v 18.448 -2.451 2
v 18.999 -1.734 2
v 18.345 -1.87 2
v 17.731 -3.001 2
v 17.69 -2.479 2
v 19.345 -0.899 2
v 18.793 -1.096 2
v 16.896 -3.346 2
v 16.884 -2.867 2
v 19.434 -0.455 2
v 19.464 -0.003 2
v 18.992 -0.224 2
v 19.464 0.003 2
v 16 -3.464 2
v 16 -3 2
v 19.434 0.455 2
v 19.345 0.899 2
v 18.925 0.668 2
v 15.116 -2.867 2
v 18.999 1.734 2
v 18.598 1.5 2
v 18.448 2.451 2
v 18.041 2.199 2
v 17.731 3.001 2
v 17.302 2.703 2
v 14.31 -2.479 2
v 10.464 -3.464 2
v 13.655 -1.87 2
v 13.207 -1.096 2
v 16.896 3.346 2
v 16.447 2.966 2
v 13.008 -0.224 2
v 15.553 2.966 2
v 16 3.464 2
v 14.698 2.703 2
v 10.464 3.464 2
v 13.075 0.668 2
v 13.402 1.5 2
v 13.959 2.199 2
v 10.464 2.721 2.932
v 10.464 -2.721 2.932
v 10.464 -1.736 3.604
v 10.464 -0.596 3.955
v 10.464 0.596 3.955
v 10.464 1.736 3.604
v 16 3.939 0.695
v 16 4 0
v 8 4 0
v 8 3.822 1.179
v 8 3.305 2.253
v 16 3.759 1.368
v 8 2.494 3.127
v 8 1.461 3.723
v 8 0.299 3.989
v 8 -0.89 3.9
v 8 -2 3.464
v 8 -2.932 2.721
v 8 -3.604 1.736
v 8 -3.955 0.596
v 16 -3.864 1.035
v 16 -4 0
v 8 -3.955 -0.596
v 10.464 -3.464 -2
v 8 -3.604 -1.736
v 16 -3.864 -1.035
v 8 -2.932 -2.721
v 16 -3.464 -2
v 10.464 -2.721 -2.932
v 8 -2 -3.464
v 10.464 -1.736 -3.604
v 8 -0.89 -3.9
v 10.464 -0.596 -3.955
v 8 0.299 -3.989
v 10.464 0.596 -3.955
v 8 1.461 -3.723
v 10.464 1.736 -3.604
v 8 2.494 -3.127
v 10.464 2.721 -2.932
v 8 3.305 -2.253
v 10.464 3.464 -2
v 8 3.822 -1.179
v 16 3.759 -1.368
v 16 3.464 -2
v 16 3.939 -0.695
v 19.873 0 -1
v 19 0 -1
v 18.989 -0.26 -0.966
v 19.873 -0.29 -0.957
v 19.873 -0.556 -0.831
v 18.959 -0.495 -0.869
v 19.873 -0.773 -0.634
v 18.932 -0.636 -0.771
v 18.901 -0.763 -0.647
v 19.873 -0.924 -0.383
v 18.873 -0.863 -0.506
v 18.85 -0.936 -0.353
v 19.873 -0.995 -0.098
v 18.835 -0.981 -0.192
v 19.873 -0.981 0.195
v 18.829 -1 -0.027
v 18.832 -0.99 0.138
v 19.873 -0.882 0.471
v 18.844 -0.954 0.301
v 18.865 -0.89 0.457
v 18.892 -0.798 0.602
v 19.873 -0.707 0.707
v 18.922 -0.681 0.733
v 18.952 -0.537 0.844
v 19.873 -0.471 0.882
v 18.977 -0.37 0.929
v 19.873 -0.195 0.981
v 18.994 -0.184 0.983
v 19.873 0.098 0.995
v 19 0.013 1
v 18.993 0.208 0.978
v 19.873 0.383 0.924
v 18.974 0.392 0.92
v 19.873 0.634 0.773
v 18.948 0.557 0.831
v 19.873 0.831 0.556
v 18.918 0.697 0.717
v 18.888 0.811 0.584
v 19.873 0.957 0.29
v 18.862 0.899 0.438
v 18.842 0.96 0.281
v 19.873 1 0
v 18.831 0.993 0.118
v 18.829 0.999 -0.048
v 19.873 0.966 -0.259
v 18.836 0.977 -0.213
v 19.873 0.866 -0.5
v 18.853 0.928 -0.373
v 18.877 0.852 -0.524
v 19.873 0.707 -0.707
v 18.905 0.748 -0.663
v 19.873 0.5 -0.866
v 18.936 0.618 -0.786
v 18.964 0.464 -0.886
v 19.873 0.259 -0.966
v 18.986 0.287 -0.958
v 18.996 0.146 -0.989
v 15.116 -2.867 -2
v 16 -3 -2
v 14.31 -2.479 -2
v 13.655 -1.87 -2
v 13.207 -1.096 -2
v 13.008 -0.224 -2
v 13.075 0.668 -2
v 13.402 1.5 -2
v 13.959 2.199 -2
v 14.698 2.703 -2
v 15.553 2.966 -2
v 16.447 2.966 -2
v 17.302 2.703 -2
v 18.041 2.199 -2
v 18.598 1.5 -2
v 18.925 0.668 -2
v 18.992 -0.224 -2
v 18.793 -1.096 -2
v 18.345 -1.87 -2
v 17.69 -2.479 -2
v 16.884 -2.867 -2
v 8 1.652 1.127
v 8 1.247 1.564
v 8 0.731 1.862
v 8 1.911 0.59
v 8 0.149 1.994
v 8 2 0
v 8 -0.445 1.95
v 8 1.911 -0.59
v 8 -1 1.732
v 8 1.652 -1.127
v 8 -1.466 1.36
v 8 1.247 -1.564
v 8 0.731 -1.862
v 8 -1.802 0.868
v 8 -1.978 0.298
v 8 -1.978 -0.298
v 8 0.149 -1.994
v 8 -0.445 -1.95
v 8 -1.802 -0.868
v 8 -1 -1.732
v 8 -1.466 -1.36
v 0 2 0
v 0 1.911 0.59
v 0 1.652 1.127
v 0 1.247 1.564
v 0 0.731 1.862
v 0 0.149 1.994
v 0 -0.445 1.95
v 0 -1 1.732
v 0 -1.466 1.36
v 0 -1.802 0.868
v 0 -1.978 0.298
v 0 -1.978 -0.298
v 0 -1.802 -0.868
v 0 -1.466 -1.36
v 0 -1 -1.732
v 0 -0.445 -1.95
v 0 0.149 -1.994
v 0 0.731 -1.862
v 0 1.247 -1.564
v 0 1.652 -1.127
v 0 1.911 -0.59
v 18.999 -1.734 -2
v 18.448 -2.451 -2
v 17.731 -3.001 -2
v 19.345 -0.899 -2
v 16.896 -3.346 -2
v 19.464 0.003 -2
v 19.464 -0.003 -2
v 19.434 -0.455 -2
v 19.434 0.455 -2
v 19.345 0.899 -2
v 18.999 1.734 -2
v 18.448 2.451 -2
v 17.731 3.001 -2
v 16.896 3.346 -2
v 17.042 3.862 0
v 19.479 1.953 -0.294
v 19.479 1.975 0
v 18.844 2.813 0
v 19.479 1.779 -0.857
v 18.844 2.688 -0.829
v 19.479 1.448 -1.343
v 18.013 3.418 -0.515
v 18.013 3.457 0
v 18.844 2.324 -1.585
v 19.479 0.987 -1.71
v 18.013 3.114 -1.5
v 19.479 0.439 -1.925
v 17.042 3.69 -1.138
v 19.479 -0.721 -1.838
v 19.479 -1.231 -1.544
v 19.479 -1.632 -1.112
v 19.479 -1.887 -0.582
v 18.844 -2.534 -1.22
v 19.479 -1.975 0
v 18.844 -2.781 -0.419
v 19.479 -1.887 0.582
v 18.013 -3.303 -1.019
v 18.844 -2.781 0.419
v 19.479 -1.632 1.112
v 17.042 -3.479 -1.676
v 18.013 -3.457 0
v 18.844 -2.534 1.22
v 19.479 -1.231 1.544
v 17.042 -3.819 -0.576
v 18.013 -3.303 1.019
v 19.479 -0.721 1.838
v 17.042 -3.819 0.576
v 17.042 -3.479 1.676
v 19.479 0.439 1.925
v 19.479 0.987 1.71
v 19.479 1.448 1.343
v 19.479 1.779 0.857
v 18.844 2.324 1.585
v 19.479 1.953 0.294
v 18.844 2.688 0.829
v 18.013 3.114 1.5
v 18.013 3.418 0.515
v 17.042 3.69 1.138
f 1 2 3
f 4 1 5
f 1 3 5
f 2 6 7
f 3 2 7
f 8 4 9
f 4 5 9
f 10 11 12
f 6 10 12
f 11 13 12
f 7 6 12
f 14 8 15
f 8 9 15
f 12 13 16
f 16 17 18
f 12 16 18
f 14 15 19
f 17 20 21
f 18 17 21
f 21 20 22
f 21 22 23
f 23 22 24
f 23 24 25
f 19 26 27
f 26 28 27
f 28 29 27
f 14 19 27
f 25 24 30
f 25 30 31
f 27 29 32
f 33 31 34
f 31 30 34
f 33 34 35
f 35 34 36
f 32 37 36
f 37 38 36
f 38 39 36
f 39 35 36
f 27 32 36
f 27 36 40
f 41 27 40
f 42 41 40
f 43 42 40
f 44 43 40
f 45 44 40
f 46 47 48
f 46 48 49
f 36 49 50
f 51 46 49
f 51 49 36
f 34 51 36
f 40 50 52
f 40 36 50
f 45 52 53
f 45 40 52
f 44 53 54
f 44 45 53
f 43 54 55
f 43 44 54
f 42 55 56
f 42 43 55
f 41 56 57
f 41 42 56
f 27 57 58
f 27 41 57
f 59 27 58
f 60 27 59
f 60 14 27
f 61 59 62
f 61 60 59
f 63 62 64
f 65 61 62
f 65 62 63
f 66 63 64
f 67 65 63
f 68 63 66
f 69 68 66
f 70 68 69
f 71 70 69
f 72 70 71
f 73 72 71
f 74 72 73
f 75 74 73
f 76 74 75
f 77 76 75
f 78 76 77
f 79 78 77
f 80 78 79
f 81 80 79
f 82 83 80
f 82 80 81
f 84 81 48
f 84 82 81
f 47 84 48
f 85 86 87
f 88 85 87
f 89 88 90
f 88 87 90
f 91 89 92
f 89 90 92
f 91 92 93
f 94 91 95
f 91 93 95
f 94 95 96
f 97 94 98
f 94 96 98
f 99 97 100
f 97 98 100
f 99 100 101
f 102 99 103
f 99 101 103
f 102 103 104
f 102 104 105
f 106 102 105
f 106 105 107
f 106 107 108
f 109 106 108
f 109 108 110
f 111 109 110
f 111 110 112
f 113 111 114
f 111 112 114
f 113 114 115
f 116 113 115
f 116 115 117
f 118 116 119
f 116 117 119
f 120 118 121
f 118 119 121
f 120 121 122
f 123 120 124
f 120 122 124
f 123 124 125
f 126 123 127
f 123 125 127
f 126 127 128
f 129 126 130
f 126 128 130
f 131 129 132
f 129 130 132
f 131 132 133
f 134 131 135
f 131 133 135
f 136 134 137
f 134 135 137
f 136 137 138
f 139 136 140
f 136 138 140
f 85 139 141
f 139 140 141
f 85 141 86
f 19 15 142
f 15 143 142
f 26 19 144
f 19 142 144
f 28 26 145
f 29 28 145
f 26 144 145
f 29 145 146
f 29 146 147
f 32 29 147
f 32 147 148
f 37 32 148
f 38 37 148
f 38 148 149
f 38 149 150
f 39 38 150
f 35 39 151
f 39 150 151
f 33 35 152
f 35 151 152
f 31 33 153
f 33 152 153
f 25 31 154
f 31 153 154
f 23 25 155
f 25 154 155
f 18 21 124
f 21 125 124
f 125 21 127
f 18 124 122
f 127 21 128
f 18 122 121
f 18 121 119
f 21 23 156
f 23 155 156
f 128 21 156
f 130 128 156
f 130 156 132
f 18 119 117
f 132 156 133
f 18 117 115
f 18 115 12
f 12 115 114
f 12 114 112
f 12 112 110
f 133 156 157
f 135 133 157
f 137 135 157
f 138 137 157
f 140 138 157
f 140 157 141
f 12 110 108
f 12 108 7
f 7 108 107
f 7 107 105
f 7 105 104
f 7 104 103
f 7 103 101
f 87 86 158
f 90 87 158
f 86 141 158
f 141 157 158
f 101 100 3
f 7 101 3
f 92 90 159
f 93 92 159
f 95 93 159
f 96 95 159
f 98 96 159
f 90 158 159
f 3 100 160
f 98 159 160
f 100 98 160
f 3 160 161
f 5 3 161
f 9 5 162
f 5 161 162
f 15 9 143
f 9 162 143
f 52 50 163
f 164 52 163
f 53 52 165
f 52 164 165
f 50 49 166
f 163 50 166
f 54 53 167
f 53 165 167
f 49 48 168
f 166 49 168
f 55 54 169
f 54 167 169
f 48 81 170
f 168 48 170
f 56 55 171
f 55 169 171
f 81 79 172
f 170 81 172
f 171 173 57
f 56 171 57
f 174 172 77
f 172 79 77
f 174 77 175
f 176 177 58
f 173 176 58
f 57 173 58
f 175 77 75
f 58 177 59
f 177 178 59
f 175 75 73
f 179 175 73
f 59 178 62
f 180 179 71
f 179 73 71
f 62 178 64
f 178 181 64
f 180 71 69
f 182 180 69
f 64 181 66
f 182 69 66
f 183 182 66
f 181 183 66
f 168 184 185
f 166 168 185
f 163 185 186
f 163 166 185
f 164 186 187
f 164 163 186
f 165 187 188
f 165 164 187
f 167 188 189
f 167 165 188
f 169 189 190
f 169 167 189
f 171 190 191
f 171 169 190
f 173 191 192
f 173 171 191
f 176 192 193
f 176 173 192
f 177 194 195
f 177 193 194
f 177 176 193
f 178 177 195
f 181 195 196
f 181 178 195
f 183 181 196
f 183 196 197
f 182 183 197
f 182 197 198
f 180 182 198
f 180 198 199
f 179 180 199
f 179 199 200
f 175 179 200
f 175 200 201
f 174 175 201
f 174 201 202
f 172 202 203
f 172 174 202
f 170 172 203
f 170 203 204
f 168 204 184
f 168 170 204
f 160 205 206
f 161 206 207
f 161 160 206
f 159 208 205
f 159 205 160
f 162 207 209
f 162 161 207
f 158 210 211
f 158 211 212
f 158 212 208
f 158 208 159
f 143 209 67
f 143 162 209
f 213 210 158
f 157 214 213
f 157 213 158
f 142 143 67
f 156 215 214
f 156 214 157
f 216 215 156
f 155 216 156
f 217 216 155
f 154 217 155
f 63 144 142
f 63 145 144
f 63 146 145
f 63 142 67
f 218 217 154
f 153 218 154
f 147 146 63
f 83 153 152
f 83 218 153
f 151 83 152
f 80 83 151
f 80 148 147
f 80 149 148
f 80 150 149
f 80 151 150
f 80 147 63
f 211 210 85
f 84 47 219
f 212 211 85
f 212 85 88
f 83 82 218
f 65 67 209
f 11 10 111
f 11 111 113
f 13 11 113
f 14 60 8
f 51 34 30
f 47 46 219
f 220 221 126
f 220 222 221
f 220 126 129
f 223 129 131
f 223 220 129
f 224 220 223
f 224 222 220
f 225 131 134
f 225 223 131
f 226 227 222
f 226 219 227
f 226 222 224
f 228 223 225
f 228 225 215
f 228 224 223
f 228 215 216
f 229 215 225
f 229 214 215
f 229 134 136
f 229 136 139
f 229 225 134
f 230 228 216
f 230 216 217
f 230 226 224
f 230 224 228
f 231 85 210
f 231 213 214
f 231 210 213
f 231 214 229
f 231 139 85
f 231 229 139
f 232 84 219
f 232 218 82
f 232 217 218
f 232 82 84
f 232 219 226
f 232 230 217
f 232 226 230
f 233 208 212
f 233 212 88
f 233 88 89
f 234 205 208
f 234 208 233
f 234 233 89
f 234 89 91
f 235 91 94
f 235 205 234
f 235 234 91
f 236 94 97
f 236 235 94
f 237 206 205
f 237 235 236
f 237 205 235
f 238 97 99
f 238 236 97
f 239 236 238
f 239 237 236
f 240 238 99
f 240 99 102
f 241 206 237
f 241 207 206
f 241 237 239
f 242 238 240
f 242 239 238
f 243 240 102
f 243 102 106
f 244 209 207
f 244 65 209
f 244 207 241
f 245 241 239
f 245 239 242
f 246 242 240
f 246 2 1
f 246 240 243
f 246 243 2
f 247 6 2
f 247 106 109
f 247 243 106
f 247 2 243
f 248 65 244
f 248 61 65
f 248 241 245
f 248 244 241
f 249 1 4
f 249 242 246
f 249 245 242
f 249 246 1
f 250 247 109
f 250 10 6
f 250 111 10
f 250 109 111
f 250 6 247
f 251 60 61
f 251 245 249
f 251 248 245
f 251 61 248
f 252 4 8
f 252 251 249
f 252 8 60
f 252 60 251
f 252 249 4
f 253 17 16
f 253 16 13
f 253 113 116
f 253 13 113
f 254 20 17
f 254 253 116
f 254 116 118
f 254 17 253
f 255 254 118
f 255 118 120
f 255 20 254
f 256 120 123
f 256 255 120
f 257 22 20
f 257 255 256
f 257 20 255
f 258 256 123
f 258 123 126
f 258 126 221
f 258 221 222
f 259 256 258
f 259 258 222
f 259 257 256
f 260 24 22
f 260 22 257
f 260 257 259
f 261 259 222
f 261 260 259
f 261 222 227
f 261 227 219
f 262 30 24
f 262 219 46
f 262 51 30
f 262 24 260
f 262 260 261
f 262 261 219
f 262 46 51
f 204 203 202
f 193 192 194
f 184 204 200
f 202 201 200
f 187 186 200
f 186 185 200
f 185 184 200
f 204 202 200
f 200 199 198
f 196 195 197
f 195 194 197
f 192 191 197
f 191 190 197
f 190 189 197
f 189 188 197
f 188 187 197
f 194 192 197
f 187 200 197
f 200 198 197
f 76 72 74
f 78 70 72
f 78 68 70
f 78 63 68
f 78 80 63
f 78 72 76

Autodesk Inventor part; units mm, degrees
ref_plane "XY Plane" through (0, 0, 0) normal (0, 0, 1) x (1, 0, 0)
sketch "Sketch1" plane through (0, 0, 0) normal (0, 0, 1) x (1, 0, 0)
  line L0 (0, 0) -> (0, 2)
  line L1 (0, 2) -> (8, 2)
  line L2 (8, 2) -> (8, 4)
  line L3 (8, 4) -> (16, 4)
  arc A0 (20, 0) -> (16, 4) centre (16, 0) ccw
  line L4 (20, 0) -> (0, 0)
  dimension "d0" = 4
  dimension "d1" = 8
  dimension "d2" = 8
  dimension "d3" = 4
  dimension "d4" = 8
revolve "Revolution1" add sketch "Sketch1" angle 360 about axis through (20, 0, 0) along (-1, 0, 0)
thread "Thread1" size "M4x0.7" class "6g" standard "ISO Metric profile" length 11 offset 3
ref_plane "Work Plane2" through (0, 4, 0) normal (0, 1, 0) x (-1, 0, 0)
sketch "Sketch3" plane through (0, 4, 0) normal (0, 1, 0) x (-1, 0, 0)
  arc A0 (-16, 4) -> (-16, -4) centre (-16, 0) ccw projected
  line L0 (-16, -4) -> (-8, -4) projected
  line L1 (-8, -4) -> (-8, 4) projected
  line L2 (-16, 4) -> (-8, 4) projected
  line L3 (-19.4641, -2) -> (-10.4641, -2)
  line L4 (-10.4641, -2) -> (-10.4641, -4)
  line L5 (-19.4641, 2) -> (-10.4641, 2)
  line L6 (-10.4641, 2) -> (-10.4641, 4)
  point P0 (0, 0)
  dimension "d10" = 9
  dimension "d11" = 4
  dimension "d12" = 2
extrude "Extrusion1" cut sketch "Sketch3" against normal blind 8 contours L2 L6 L5 A0 | L3 L4 L0 A0
sketch "Sketch4" plane through (10.4641, -3.4641, 2) normal (0, 0, 1) x (1, 0, 0)
  arc A0 (5.5359, 0) -> (5.5359, 6.9282) centre (5.5359, 3.4641) ccw projected
  point P0 (-10.4641, 3.4641)
  point P1 (5.5359, 3.4641)
hole "Hole1" at (16, 0, 2) direction (0, 0, -1) diameter 6 depth 4
ref_plane "Work Plane3" through (20, 0, 0) normal (1, 0, 0) x (0, 1, 0)
sketch "Sketch5" plane through (20, 0, 0) normal (1, 0, 0) x (0, 1, 0)
  point P0 (0, 0)
  point P1 (0, 0)
hole "Hole2" at (20, 0, 0) direction (-1, 0, 0) diameter 2 depth 2.5
equation "\"d12\" = 0.5 * d11"
properties part number "9"
